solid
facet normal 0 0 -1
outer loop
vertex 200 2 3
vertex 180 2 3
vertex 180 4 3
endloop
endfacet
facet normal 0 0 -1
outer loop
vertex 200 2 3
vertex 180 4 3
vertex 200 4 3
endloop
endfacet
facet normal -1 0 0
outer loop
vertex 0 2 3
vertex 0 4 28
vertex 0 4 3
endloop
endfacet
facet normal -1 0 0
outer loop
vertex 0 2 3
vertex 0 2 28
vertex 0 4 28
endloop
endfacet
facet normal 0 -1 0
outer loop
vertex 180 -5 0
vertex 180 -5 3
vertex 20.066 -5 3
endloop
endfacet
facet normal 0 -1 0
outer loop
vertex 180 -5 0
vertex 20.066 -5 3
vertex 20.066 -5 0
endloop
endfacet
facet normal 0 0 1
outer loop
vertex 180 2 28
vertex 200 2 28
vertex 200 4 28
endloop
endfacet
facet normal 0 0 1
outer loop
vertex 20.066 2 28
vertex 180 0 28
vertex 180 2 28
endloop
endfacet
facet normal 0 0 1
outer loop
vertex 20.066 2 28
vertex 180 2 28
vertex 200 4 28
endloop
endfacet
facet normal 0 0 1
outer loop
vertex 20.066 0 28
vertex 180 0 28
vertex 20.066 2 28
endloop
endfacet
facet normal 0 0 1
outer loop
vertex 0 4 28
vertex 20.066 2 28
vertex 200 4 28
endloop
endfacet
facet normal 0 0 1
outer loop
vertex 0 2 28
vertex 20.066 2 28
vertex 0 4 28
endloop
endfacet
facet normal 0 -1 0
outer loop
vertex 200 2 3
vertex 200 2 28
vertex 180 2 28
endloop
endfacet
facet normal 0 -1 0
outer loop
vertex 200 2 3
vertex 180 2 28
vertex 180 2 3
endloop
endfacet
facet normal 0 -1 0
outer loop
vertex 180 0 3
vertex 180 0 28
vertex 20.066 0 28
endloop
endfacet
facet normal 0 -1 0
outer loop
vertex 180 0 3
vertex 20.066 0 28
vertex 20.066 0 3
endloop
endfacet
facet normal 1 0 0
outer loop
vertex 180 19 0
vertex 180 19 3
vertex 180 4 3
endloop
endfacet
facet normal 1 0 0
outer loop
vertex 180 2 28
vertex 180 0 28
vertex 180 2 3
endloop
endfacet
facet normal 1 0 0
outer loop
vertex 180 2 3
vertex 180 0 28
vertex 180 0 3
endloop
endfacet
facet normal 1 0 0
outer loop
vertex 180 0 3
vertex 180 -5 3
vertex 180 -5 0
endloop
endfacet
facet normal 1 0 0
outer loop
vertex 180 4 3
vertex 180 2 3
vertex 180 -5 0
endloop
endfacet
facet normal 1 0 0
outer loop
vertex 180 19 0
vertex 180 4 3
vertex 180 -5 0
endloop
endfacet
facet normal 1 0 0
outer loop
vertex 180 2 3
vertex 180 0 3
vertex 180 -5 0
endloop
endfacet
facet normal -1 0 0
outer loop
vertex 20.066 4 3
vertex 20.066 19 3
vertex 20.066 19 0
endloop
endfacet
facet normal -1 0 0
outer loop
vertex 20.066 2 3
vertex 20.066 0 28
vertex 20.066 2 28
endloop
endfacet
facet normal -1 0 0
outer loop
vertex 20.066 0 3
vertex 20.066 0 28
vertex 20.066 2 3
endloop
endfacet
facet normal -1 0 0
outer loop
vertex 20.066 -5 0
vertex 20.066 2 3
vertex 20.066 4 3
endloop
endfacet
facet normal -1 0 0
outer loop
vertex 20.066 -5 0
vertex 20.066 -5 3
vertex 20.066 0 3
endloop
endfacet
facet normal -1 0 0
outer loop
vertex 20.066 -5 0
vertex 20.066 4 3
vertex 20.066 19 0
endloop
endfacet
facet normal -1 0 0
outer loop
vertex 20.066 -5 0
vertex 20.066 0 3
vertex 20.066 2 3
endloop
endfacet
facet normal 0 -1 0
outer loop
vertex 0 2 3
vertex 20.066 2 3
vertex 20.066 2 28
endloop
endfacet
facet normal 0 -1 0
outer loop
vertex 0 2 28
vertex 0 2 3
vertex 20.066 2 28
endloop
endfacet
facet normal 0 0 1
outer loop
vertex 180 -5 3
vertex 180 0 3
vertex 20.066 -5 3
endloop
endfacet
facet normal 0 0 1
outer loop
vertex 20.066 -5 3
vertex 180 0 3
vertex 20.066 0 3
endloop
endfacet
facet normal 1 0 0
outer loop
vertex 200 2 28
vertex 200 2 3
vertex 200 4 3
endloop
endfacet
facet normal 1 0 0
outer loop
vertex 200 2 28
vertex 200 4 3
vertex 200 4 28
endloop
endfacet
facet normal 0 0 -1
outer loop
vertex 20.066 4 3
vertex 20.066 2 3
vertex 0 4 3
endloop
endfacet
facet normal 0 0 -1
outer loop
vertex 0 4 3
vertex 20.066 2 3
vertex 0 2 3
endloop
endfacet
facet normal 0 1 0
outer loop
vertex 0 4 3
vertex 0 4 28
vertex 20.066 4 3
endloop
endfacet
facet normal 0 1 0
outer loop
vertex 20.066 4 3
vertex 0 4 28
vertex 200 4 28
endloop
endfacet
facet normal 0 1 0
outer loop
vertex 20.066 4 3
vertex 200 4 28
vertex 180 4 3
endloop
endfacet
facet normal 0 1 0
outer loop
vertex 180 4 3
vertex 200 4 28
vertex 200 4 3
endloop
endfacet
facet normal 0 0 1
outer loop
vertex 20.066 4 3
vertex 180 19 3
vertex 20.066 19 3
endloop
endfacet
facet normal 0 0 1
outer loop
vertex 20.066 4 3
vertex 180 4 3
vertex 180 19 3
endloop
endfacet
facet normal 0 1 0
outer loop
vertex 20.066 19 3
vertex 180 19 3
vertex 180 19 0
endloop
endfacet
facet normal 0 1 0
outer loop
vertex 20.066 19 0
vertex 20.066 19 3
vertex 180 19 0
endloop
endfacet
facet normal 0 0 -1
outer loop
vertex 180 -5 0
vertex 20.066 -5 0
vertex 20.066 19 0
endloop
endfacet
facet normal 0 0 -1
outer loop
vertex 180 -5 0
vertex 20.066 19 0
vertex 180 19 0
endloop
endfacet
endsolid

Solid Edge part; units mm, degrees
sketch "Sketch1" plane through (0, 0, 0) normal (0, -1, 0) x (1, 0, 0)
  line L0 (200, 28) -> (0, 28)
  line L1 (0, 28) -> (0, 0)
  line L2 (0, 0) -> (200, 0)
  line L3 (200, 0) -> (200, 28)
extrude "Protrusion1" add sketch "Sketch1" against normal blind 4
sketch "Sketch2" plane through (77.37, 0, 14) normal (0, -1, 0) x (1, 0, 0)
  line L0 (102.63, -11) -> (-57.3035, -11)
  line L1 (-57.3035, -11) -> (-57.3035, -14)
  line L2 (-57.3035, -14) -> (102.63, -14)
  line L3 (102.63, -14) -> (102.63, -11)
extrude "Protrusão_Extrudada_6" add sketch "Sketch2" along normal blind 5
sketch "Sketch3" plane through (77.37, 0, 14) normal (0, -1, 0) x (1, 0, 0)
  line L0 (102.63, -11) -> (-57.3035, -11)
  line L1 (-57.3035, -11) -> (-57.3035, -14)
  line L2 (-57.3035, -14) -> (102.63, -14)
  line L3 (102.63, -14) -> (102.63, -11)
extrude "Protrusão_Extrudada_7" add sketch "Sketch3" against normal blind 19
sketch "Sketch4" plane through (77.37, 0, 14) normal (0, -1, 0) x (-1, 0, 0)
  line L0 (-102.63, -14) -> (-102.63, 11)
  line L1 (-102.63, 11) -> (-122.63, 11)
  line L2 (-122.63, 11) -> (-122.63, -14)
  line L3 (-122.63, -14) -> (-102.63, -14)
  line L4 (57.3035, -14) -> (57.3035, 11)
  line L5 (57.3035, 11) -> (77.37, 11)
  line L6 (77.37, 11) -> (77.37, -14)
  line L7 (77.37, -14) -> (57.3035, -14)
  dimension "D1" = 20
  dimension "D2" = 20.0665
  dimension "D3" = 25
  dimension "D4" = 25
extrude "Recorte_Extrudado_5" cut sketch "Sketch4" against normal blind 2
sketch "Sketch5" plane through (77.37, 0, 14) normal (0, -1, 0) x (1, 0, 0)
  line L0 (102.63, -14) -> (102.63, -11)
  line L1 (102.63, -11) -> (122.63, -11)
  line L2 (122.63, -14) -> (122.63, -11)
  line L3 (102.63, -14) -> (122.63, -14)
extrude "Recorte_Extrudado_6" cut sketch "Sketch5" against normal blind 21.6353
sketch "Sketch6" plane through (0, 0, 0) normal (0, -1, 0) x (1, 0, 0)
  line L0 (20.0665, 3) -> (20.0665, 0)
  line L1 (0, 0) -> (20.0665, 0)
  line L2 (0, 3) -> (0, 0)
  line L3 (20.0665, 3) -> (0, 3)
extrude "Recorte_Extrudado_7" cut sketch "Sketch6" against normal blind 21.2624
